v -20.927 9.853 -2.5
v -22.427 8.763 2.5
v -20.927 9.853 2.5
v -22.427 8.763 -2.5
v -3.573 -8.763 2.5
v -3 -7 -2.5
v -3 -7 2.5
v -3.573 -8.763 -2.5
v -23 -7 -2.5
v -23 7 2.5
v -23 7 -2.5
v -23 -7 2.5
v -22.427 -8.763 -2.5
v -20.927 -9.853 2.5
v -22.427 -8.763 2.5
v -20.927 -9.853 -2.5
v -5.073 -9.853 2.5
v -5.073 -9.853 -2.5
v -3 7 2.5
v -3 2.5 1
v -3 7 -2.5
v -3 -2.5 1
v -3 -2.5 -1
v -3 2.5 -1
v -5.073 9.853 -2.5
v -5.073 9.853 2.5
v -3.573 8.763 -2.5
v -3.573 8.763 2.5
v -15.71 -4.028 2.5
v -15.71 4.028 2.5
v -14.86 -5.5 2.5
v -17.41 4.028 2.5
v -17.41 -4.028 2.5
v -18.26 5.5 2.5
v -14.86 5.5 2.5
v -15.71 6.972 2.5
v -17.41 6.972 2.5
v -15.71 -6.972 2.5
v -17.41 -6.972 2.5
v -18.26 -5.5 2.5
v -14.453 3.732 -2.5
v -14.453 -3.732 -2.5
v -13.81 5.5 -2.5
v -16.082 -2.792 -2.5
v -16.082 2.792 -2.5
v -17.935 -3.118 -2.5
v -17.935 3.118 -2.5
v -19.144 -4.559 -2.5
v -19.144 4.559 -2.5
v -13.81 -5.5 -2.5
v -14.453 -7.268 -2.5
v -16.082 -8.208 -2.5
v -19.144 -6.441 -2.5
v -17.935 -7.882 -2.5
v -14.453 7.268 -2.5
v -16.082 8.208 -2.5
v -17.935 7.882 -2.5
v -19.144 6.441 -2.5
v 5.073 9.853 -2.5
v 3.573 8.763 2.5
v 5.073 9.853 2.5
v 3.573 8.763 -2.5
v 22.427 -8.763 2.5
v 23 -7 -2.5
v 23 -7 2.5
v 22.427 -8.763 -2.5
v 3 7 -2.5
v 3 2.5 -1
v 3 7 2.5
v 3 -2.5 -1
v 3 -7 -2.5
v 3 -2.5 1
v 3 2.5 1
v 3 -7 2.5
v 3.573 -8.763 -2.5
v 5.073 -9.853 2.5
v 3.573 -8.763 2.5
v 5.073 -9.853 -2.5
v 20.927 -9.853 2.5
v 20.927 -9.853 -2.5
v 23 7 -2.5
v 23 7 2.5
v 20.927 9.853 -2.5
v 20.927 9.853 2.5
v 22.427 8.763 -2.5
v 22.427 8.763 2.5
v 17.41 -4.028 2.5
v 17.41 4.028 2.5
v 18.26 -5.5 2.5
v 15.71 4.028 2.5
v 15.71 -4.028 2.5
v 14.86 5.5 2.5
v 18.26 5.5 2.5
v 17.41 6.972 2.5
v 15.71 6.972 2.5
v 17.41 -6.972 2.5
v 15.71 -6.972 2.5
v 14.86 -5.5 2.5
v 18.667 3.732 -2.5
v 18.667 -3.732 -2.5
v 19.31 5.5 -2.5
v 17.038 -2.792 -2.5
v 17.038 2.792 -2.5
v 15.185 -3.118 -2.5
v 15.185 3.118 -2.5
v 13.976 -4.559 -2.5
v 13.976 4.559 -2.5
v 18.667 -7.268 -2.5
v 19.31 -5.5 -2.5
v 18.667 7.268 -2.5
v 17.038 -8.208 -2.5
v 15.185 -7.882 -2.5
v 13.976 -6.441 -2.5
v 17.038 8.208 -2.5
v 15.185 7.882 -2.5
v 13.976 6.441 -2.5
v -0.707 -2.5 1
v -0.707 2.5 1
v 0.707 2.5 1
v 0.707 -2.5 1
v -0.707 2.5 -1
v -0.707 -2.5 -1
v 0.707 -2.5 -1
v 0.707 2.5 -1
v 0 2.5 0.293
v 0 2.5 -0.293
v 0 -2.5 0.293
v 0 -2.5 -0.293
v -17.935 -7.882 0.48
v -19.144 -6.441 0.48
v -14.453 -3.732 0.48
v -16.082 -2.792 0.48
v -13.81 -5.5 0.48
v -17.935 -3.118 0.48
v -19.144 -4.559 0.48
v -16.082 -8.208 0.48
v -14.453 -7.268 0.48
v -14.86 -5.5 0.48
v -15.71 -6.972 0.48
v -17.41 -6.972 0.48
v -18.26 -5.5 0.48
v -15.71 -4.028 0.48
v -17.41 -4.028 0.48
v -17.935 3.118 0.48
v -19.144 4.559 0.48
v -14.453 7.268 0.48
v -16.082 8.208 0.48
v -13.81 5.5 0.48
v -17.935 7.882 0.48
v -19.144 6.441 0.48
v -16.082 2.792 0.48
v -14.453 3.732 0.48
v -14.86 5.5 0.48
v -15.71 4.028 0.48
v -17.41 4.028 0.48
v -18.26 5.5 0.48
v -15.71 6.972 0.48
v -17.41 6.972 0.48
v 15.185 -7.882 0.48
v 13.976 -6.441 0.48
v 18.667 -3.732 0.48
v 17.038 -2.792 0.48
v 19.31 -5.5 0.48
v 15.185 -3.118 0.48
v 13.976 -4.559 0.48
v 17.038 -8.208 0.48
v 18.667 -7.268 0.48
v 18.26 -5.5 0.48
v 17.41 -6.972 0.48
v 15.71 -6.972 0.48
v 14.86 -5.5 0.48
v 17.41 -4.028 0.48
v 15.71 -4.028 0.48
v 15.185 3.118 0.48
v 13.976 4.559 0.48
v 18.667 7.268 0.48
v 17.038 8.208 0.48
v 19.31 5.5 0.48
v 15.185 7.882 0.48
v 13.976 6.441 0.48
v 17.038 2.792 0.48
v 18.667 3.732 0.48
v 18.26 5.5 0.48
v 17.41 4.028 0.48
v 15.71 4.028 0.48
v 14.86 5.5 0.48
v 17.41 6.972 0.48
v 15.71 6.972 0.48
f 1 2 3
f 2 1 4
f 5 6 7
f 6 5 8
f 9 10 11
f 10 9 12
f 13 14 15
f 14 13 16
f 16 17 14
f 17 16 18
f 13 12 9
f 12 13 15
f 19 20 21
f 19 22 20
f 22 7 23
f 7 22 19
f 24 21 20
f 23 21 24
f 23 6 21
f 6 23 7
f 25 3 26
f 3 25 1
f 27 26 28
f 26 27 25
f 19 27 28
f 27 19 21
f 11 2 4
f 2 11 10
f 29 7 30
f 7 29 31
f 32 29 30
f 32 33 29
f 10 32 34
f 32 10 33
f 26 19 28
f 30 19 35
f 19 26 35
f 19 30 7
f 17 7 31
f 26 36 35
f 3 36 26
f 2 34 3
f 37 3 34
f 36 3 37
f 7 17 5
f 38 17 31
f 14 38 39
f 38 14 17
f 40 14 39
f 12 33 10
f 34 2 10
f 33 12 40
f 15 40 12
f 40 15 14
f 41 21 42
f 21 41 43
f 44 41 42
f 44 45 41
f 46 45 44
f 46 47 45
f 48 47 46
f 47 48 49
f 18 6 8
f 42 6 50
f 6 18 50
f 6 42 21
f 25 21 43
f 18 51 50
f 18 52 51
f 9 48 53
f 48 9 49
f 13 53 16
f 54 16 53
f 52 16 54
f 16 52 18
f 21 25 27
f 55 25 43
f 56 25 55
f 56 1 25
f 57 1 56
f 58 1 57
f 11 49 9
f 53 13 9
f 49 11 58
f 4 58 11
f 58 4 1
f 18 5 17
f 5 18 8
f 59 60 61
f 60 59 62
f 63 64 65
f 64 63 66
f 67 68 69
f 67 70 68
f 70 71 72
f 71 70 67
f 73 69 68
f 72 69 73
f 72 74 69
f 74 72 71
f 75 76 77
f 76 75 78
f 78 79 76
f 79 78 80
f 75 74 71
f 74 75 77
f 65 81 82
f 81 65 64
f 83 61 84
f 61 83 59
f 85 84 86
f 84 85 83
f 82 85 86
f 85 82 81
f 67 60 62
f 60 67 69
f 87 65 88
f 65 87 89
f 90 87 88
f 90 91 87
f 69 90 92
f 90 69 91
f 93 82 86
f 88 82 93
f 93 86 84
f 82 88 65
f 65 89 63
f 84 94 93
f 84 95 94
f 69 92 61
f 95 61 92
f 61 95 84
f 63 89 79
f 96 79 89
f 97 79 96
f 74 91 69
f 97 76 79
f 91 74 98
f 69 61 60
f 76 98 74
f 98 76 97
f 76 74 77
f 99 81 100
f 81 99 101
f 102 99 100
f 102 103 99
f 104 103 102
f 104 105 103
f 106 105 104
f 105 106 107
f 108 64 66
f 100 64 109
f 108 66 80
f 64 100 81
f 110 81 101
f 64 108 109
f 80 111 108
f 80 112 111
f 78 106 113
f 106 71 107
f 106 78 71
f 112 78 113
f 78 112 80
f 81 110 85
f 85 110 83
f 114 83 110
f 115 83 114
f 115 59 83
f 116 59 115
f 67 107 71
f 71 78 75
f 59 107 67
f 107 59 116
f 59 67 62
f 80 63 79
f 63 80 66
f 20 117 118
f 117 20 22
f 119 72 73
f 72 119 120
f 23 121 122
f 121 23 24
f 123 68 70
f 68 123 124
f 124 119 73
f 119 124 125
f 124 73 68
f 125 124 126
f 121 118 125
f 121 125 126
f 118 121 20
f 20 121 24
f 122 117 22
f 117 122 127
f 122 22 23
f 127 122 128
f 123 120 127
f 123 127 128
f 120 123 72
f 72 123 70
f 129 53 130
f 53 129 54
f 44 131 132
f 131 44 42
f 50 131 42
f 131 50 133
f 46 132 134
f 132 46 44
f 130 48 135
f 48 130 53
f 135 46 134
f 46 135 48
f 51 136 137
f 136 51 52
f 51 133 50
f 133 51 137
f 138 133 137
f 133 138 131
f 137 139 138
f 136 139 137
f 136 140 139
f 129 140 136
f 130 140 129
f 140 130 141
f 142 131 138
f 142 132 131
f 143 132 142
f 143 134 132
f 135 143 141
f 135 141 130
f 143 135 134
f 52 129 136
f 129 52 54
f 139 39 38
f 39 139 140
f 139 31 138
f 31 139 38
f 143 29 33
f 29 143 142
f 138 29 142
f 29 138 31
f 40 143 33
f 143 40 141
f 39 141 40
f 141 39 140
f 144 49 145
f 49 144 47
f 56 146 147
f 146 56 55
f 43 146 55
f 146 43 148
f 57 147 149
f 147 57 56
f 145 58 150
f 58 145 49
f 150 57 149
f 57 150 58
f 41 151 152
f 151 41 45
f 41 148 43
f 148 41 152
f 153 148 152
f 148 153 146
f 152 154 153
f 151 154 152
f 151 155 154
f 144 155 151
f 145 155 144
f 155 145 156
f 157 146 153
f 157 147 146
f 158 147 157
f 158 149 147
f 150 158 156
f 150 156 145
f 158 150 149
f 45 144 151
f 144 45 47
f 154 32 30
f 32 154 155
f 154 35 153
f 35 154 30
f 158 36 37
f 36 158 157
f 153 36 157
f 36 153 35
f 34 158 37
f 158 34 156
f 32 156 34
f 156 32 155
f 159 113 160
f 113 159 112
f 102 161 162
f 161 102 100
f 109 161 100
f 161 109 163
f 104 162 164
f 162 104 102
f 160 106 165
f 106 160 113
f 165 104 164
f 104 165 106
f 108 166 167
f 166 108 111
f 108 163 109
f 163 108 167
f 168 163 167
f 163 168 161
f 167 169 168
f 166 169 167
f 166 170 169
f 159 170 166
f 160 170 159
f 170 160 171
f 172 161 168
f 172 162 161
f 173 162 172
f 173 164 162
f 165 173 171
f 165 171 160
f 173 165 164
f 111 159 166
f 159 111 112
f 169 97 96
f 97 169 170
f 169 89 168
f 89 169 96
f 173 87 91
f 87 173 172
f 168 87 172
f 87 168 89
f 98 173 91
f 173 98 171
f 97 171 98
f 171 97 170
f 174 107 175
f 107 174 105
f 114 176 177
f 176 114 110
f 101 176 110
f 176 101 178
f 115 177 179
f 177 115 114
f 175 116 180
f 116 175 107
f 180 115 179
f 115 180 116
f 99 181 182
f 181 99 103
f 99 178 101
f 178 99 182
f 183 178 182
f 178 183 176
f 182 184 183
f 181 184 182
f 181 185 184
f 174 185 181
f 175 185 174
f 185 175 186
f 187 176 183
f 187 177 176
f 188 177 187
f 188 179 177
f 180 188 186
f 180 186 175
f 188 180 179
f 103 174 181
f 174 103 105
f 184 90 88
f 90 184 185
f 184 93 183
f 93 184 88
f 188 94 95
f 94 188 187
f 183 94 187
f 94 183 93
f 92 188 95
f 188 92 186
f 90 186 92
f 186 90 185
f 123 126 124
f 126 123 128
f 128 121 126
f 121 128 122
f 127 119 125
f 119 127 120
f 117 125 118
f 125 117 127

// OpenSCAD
// file: ../lib/params_gen.scad
// GENERATED by `python -m bestiary.robots.whelp.export`. DO NOT EDIT.
//
// Every number here comes from spec.py, which carries its provenance, or from
// geometry.py, which derives it. check.py fails if regenerating this file changes
// it, so a hand edit here is not merely discouraged -- it is caught.
//
// To change a dimension: edit spec.py, re-run export, commit both.


// 73 constants,
// spec = whelp16, servo = STS3215-C018, material = PETG

TRUNK_L = 250;
TRUNK_W = 104;
TRUNK_H = 58;
TRUNK_WALL = 2.4;
TRUNK_LAP = 26;
ABDUCT_X = 92;
ABDUCT_Y = 36;
ABDUCT_TO_HIP = 36;
ABDUCT_TO_HIP_DROP = 0;
THIGH_L = 110;
CALF_L = 100;
WHEEL_R = 45;
WHEEL_W = 24;
CALF_TO_WHEEL_PLANE = 17;
THIGH_D = 30;
THIGH_WID = 32;
THIGH_WALL = 3.2;
CALF_D = 26;
CALF_WID = 24;
CALF_WALL = 3.2;
FILLET_R = 3;
SERVO_BODY_L = 45.2;
SERVO_BODY_W = 24.7;
SERVO_BODY_H = 35;
SERVO_HORN_BOLT_CIRCLE_D = 17;
SERVO_HORN_BOLT_COUNT = 4;
SERVO_HORN_BOLT_D = 2;
SERVO_HORN_D = 22;
SERVO_HORN_THICK = 2.5;
HORN_BOSS_THICK = 5;
SERVO_HORN_FACE_TO_BODY = 3.5;
SERVO_HORN_HUB_CLEAR_D = 9;
SERVO_HORN_HUB_CLEAR_H = 4;
SERVO_MOUNT_HOLE_DX = 38;
SERVO_MOUNT_HOLE_DY = 18;
SERVO_EAR_SPAN_L = 54;
SERVO_EAR_THICK = 2.5;
SERVO_EAR_Z_FROM_BODY_MID = 10;
SERVO_HAS_REAR_BOSS = true;
SERVO_REAR_BOSS_D = 6;
SERVO_REAR_BOSS_H = 2;
SERVO_OUTPUT_BOSS_D = 12;
SERVO_CABLE_D = 5;
SERVO_CABLE_INSET = 6;
SERVO_CABLE_STUB = 18;
INSERT_BORE = 4.2;
INSERT_OD = 4.6;
INSERT_L = 5.7;
INSERT_WALL = 1.8;
M3_CLEAR = 3.4;
M3_HEAD_D = 5.5;
M3_HEAD_H = 3;
M3_NUT_AF = 5.5;
M3_NUT_T = 2.4;
IDLER_BEARING_ID = 3;
IDLER_BEARING_OD = 10;
IDLER_BEARING_W = 4;
IDLER_BEARING_SHELF = 1.2;
BEARING_PRESS_FIT = -0.2;
TIRE_T = 12;
FUSE_T = 2;
FUSE_SHEAR_AREA = 10;
FUSE_ENABLE = true;
BED_X = 220;
BED_Y = 220;
BED_Z = 240;
NOZZLE = 0.4;
LAYER = 0.2;
FN = 64;

// Derived clearances (nominal thread + printing allowance).
SERVO_MOUNT_SCREW_CLEAR_D = 2.9;
SERVO_MOUNT_SCREW_HEAD_D = 5;
SERVO_MOUNT_SCREW_HEAD_H = 2.5;
SERVO_HORN_BOLT_CLEAR_D = 2.35;
// main file
// fuse.scad — the sacrificial link between the calf and the wheel mount.
//
// The cheapest part on the robot and the one with the clearest job: BE THE THING
// THAT BREAKS. Two grams, four minutes to print, two M3 to swap.
//
// WHY IT EXISTS, IN ONE PARAGRAPH
// -------------------------------
// The leg's other failure thresholds, in newtons at the contact patch, are: the
// servo's own torque limit at 26 N (but only for SLOW loads -- a 1:345 gearbox
// reflects so much rotor inertia that it is rigid for anything shorter than
// about 100 ms), the output gear train at ~92 N, and the calf itself at ~470 N
// laterally. A side impact -- tipping over, or driving a wheel into a table leg
// -- lands somewhere in the hundreds of newtons, which is above the calf. So
// without this part, a fall breaks a 40-gram leg that takes three hours to
// reprint. With it, a fall breaks this instead.
//
// SIZING IS A TWO-SIDED CONSTRAINT AND BOTH SIDES MATTER
// -----------------------------------------------------
// Strong enough never to trip in normal use: each wheel carries about 5.6 N
// standing and 24 N in a design landing, and this shears at roughly 280 N, so
// there is better than 10x headroom. A fuse that nuisance-trips is worse than no
// fuse at all, because whoever is building the robot will simply leave it out
// and then have neither.
//
// Weak enough to go before the calf: 280 N against the calf's ~470 N in lateral
// bending. torque.py computes both and check.py asserts the ordering, so
// changing FUSE_SHEAR_AREA in spec.py cannot silently invert it.
//
// WHAT IT DOES *NOT* PROTECT
// --------------------------
// A hard VERTICAL landing. To trip before the gear train's ~92 N this web would
// have to be about 2 mm^2 -- unprintable, and close enough to a real landing
// that it would nuisance-trip. Vertical impact is therefore bounded by the drop
// envelope in the torque report rather than by a part, and that is a real
// conclusion rather than a gap: you cannot fuse a rigid gearbox in series
// without the fuse becoming the thing that fails constantly.
//
// THE SHEAR STRENGTH IS AN ASSUMPTION
// -----------------------------------
// spec.print_shear_strength_mpa is 28 MPa, taken as ~0.6x PETG's tensile yield,
// and it is Kind.ASSUMED. The whole ordering above rests on it. Its
// `replaced_by` is a ten-minute experiment: put one of these in a vice and pull
// it with a luggage scale. Do that before trusting any of the numbers in this
// comment.

include <../lib/params_gen.scad>
use <../lib/util.scad>

EPS = 0.02;

//: Bolt spacing to the calf and to the wheel mount. Two M3 each side.
FUSE_BOLT_PITCH = 22;
FUSE_LEN = 46;
FUSE_TAB_W = 20;

// The shear web's width follows from the area spec.py sizes, so the break load
// is a NUMBER IN THE SPEC rather than a shape somebody drew. Editing the web by
// eye is how a fuse stops being a fuse.
FUSE_WEB_W = FUSE_SHEAR_AREA / FUSE_T;

module fuse() {
    difference() {
        union() {
            // Two mounting tabs, full thickness, with the bolt holes.
            for (s = [-1, 1])
                translate([s * (FUSE_LEN / 2 - FUSE_TAB_W / 2), 0, 0])
                    rounded_plate(FUSE_TAB_W, FUSE_TAB_W, FUSE_T * 2.5, r = 3);

            // The web between them. Deliberately thin, and deliberately the only
            // load path: a rib bridging the two tabs would carry the load around
            // the web and the part would stop being a fuse without looking any
            // different.
            cube([FUSE_LEN, FUSE_WEB_W, FUSE_T], center = true);
        }

        // Bolt holes, counterbored so the heads sit flush against the calf.
        for (sx = [-1, 1], sy = [-1, 1])
            translate([sx * FUSE_LEN / 2 * 0.72, sy * FUSE_BOLT_PITCH / 4, -FUSE_T * 1.25 - EPS])
                cap_screw_hole(M3_CLEAR, M3_HEAD_D, M3_HEAD_H, FUSE_T * 2.5 + 2 * EPS);

        // A stress-raising notch across the middle of the web, on BOTH faces.
        //
        // This is the one place on the robot where a sharp corner is wanted. Every
        // other internal corner is filleted to keep the stress concentration near
        // 1.5 instead of 3; here the concentration is the feature, because it
        // makes the break happen at a known place and at a repeatable load
        // instead of wherever the print happened to be weakest.
        for (sz = [-1, 1])
            translate([0, 0, sz * FUSE_T / 2])
                rotate([0, 45, 0])
                    cube([FUSE_T * 0.5, FUSE_WEB_W + 2, FUSE_T * 0.5], center = true);
    }
}

fuse();
